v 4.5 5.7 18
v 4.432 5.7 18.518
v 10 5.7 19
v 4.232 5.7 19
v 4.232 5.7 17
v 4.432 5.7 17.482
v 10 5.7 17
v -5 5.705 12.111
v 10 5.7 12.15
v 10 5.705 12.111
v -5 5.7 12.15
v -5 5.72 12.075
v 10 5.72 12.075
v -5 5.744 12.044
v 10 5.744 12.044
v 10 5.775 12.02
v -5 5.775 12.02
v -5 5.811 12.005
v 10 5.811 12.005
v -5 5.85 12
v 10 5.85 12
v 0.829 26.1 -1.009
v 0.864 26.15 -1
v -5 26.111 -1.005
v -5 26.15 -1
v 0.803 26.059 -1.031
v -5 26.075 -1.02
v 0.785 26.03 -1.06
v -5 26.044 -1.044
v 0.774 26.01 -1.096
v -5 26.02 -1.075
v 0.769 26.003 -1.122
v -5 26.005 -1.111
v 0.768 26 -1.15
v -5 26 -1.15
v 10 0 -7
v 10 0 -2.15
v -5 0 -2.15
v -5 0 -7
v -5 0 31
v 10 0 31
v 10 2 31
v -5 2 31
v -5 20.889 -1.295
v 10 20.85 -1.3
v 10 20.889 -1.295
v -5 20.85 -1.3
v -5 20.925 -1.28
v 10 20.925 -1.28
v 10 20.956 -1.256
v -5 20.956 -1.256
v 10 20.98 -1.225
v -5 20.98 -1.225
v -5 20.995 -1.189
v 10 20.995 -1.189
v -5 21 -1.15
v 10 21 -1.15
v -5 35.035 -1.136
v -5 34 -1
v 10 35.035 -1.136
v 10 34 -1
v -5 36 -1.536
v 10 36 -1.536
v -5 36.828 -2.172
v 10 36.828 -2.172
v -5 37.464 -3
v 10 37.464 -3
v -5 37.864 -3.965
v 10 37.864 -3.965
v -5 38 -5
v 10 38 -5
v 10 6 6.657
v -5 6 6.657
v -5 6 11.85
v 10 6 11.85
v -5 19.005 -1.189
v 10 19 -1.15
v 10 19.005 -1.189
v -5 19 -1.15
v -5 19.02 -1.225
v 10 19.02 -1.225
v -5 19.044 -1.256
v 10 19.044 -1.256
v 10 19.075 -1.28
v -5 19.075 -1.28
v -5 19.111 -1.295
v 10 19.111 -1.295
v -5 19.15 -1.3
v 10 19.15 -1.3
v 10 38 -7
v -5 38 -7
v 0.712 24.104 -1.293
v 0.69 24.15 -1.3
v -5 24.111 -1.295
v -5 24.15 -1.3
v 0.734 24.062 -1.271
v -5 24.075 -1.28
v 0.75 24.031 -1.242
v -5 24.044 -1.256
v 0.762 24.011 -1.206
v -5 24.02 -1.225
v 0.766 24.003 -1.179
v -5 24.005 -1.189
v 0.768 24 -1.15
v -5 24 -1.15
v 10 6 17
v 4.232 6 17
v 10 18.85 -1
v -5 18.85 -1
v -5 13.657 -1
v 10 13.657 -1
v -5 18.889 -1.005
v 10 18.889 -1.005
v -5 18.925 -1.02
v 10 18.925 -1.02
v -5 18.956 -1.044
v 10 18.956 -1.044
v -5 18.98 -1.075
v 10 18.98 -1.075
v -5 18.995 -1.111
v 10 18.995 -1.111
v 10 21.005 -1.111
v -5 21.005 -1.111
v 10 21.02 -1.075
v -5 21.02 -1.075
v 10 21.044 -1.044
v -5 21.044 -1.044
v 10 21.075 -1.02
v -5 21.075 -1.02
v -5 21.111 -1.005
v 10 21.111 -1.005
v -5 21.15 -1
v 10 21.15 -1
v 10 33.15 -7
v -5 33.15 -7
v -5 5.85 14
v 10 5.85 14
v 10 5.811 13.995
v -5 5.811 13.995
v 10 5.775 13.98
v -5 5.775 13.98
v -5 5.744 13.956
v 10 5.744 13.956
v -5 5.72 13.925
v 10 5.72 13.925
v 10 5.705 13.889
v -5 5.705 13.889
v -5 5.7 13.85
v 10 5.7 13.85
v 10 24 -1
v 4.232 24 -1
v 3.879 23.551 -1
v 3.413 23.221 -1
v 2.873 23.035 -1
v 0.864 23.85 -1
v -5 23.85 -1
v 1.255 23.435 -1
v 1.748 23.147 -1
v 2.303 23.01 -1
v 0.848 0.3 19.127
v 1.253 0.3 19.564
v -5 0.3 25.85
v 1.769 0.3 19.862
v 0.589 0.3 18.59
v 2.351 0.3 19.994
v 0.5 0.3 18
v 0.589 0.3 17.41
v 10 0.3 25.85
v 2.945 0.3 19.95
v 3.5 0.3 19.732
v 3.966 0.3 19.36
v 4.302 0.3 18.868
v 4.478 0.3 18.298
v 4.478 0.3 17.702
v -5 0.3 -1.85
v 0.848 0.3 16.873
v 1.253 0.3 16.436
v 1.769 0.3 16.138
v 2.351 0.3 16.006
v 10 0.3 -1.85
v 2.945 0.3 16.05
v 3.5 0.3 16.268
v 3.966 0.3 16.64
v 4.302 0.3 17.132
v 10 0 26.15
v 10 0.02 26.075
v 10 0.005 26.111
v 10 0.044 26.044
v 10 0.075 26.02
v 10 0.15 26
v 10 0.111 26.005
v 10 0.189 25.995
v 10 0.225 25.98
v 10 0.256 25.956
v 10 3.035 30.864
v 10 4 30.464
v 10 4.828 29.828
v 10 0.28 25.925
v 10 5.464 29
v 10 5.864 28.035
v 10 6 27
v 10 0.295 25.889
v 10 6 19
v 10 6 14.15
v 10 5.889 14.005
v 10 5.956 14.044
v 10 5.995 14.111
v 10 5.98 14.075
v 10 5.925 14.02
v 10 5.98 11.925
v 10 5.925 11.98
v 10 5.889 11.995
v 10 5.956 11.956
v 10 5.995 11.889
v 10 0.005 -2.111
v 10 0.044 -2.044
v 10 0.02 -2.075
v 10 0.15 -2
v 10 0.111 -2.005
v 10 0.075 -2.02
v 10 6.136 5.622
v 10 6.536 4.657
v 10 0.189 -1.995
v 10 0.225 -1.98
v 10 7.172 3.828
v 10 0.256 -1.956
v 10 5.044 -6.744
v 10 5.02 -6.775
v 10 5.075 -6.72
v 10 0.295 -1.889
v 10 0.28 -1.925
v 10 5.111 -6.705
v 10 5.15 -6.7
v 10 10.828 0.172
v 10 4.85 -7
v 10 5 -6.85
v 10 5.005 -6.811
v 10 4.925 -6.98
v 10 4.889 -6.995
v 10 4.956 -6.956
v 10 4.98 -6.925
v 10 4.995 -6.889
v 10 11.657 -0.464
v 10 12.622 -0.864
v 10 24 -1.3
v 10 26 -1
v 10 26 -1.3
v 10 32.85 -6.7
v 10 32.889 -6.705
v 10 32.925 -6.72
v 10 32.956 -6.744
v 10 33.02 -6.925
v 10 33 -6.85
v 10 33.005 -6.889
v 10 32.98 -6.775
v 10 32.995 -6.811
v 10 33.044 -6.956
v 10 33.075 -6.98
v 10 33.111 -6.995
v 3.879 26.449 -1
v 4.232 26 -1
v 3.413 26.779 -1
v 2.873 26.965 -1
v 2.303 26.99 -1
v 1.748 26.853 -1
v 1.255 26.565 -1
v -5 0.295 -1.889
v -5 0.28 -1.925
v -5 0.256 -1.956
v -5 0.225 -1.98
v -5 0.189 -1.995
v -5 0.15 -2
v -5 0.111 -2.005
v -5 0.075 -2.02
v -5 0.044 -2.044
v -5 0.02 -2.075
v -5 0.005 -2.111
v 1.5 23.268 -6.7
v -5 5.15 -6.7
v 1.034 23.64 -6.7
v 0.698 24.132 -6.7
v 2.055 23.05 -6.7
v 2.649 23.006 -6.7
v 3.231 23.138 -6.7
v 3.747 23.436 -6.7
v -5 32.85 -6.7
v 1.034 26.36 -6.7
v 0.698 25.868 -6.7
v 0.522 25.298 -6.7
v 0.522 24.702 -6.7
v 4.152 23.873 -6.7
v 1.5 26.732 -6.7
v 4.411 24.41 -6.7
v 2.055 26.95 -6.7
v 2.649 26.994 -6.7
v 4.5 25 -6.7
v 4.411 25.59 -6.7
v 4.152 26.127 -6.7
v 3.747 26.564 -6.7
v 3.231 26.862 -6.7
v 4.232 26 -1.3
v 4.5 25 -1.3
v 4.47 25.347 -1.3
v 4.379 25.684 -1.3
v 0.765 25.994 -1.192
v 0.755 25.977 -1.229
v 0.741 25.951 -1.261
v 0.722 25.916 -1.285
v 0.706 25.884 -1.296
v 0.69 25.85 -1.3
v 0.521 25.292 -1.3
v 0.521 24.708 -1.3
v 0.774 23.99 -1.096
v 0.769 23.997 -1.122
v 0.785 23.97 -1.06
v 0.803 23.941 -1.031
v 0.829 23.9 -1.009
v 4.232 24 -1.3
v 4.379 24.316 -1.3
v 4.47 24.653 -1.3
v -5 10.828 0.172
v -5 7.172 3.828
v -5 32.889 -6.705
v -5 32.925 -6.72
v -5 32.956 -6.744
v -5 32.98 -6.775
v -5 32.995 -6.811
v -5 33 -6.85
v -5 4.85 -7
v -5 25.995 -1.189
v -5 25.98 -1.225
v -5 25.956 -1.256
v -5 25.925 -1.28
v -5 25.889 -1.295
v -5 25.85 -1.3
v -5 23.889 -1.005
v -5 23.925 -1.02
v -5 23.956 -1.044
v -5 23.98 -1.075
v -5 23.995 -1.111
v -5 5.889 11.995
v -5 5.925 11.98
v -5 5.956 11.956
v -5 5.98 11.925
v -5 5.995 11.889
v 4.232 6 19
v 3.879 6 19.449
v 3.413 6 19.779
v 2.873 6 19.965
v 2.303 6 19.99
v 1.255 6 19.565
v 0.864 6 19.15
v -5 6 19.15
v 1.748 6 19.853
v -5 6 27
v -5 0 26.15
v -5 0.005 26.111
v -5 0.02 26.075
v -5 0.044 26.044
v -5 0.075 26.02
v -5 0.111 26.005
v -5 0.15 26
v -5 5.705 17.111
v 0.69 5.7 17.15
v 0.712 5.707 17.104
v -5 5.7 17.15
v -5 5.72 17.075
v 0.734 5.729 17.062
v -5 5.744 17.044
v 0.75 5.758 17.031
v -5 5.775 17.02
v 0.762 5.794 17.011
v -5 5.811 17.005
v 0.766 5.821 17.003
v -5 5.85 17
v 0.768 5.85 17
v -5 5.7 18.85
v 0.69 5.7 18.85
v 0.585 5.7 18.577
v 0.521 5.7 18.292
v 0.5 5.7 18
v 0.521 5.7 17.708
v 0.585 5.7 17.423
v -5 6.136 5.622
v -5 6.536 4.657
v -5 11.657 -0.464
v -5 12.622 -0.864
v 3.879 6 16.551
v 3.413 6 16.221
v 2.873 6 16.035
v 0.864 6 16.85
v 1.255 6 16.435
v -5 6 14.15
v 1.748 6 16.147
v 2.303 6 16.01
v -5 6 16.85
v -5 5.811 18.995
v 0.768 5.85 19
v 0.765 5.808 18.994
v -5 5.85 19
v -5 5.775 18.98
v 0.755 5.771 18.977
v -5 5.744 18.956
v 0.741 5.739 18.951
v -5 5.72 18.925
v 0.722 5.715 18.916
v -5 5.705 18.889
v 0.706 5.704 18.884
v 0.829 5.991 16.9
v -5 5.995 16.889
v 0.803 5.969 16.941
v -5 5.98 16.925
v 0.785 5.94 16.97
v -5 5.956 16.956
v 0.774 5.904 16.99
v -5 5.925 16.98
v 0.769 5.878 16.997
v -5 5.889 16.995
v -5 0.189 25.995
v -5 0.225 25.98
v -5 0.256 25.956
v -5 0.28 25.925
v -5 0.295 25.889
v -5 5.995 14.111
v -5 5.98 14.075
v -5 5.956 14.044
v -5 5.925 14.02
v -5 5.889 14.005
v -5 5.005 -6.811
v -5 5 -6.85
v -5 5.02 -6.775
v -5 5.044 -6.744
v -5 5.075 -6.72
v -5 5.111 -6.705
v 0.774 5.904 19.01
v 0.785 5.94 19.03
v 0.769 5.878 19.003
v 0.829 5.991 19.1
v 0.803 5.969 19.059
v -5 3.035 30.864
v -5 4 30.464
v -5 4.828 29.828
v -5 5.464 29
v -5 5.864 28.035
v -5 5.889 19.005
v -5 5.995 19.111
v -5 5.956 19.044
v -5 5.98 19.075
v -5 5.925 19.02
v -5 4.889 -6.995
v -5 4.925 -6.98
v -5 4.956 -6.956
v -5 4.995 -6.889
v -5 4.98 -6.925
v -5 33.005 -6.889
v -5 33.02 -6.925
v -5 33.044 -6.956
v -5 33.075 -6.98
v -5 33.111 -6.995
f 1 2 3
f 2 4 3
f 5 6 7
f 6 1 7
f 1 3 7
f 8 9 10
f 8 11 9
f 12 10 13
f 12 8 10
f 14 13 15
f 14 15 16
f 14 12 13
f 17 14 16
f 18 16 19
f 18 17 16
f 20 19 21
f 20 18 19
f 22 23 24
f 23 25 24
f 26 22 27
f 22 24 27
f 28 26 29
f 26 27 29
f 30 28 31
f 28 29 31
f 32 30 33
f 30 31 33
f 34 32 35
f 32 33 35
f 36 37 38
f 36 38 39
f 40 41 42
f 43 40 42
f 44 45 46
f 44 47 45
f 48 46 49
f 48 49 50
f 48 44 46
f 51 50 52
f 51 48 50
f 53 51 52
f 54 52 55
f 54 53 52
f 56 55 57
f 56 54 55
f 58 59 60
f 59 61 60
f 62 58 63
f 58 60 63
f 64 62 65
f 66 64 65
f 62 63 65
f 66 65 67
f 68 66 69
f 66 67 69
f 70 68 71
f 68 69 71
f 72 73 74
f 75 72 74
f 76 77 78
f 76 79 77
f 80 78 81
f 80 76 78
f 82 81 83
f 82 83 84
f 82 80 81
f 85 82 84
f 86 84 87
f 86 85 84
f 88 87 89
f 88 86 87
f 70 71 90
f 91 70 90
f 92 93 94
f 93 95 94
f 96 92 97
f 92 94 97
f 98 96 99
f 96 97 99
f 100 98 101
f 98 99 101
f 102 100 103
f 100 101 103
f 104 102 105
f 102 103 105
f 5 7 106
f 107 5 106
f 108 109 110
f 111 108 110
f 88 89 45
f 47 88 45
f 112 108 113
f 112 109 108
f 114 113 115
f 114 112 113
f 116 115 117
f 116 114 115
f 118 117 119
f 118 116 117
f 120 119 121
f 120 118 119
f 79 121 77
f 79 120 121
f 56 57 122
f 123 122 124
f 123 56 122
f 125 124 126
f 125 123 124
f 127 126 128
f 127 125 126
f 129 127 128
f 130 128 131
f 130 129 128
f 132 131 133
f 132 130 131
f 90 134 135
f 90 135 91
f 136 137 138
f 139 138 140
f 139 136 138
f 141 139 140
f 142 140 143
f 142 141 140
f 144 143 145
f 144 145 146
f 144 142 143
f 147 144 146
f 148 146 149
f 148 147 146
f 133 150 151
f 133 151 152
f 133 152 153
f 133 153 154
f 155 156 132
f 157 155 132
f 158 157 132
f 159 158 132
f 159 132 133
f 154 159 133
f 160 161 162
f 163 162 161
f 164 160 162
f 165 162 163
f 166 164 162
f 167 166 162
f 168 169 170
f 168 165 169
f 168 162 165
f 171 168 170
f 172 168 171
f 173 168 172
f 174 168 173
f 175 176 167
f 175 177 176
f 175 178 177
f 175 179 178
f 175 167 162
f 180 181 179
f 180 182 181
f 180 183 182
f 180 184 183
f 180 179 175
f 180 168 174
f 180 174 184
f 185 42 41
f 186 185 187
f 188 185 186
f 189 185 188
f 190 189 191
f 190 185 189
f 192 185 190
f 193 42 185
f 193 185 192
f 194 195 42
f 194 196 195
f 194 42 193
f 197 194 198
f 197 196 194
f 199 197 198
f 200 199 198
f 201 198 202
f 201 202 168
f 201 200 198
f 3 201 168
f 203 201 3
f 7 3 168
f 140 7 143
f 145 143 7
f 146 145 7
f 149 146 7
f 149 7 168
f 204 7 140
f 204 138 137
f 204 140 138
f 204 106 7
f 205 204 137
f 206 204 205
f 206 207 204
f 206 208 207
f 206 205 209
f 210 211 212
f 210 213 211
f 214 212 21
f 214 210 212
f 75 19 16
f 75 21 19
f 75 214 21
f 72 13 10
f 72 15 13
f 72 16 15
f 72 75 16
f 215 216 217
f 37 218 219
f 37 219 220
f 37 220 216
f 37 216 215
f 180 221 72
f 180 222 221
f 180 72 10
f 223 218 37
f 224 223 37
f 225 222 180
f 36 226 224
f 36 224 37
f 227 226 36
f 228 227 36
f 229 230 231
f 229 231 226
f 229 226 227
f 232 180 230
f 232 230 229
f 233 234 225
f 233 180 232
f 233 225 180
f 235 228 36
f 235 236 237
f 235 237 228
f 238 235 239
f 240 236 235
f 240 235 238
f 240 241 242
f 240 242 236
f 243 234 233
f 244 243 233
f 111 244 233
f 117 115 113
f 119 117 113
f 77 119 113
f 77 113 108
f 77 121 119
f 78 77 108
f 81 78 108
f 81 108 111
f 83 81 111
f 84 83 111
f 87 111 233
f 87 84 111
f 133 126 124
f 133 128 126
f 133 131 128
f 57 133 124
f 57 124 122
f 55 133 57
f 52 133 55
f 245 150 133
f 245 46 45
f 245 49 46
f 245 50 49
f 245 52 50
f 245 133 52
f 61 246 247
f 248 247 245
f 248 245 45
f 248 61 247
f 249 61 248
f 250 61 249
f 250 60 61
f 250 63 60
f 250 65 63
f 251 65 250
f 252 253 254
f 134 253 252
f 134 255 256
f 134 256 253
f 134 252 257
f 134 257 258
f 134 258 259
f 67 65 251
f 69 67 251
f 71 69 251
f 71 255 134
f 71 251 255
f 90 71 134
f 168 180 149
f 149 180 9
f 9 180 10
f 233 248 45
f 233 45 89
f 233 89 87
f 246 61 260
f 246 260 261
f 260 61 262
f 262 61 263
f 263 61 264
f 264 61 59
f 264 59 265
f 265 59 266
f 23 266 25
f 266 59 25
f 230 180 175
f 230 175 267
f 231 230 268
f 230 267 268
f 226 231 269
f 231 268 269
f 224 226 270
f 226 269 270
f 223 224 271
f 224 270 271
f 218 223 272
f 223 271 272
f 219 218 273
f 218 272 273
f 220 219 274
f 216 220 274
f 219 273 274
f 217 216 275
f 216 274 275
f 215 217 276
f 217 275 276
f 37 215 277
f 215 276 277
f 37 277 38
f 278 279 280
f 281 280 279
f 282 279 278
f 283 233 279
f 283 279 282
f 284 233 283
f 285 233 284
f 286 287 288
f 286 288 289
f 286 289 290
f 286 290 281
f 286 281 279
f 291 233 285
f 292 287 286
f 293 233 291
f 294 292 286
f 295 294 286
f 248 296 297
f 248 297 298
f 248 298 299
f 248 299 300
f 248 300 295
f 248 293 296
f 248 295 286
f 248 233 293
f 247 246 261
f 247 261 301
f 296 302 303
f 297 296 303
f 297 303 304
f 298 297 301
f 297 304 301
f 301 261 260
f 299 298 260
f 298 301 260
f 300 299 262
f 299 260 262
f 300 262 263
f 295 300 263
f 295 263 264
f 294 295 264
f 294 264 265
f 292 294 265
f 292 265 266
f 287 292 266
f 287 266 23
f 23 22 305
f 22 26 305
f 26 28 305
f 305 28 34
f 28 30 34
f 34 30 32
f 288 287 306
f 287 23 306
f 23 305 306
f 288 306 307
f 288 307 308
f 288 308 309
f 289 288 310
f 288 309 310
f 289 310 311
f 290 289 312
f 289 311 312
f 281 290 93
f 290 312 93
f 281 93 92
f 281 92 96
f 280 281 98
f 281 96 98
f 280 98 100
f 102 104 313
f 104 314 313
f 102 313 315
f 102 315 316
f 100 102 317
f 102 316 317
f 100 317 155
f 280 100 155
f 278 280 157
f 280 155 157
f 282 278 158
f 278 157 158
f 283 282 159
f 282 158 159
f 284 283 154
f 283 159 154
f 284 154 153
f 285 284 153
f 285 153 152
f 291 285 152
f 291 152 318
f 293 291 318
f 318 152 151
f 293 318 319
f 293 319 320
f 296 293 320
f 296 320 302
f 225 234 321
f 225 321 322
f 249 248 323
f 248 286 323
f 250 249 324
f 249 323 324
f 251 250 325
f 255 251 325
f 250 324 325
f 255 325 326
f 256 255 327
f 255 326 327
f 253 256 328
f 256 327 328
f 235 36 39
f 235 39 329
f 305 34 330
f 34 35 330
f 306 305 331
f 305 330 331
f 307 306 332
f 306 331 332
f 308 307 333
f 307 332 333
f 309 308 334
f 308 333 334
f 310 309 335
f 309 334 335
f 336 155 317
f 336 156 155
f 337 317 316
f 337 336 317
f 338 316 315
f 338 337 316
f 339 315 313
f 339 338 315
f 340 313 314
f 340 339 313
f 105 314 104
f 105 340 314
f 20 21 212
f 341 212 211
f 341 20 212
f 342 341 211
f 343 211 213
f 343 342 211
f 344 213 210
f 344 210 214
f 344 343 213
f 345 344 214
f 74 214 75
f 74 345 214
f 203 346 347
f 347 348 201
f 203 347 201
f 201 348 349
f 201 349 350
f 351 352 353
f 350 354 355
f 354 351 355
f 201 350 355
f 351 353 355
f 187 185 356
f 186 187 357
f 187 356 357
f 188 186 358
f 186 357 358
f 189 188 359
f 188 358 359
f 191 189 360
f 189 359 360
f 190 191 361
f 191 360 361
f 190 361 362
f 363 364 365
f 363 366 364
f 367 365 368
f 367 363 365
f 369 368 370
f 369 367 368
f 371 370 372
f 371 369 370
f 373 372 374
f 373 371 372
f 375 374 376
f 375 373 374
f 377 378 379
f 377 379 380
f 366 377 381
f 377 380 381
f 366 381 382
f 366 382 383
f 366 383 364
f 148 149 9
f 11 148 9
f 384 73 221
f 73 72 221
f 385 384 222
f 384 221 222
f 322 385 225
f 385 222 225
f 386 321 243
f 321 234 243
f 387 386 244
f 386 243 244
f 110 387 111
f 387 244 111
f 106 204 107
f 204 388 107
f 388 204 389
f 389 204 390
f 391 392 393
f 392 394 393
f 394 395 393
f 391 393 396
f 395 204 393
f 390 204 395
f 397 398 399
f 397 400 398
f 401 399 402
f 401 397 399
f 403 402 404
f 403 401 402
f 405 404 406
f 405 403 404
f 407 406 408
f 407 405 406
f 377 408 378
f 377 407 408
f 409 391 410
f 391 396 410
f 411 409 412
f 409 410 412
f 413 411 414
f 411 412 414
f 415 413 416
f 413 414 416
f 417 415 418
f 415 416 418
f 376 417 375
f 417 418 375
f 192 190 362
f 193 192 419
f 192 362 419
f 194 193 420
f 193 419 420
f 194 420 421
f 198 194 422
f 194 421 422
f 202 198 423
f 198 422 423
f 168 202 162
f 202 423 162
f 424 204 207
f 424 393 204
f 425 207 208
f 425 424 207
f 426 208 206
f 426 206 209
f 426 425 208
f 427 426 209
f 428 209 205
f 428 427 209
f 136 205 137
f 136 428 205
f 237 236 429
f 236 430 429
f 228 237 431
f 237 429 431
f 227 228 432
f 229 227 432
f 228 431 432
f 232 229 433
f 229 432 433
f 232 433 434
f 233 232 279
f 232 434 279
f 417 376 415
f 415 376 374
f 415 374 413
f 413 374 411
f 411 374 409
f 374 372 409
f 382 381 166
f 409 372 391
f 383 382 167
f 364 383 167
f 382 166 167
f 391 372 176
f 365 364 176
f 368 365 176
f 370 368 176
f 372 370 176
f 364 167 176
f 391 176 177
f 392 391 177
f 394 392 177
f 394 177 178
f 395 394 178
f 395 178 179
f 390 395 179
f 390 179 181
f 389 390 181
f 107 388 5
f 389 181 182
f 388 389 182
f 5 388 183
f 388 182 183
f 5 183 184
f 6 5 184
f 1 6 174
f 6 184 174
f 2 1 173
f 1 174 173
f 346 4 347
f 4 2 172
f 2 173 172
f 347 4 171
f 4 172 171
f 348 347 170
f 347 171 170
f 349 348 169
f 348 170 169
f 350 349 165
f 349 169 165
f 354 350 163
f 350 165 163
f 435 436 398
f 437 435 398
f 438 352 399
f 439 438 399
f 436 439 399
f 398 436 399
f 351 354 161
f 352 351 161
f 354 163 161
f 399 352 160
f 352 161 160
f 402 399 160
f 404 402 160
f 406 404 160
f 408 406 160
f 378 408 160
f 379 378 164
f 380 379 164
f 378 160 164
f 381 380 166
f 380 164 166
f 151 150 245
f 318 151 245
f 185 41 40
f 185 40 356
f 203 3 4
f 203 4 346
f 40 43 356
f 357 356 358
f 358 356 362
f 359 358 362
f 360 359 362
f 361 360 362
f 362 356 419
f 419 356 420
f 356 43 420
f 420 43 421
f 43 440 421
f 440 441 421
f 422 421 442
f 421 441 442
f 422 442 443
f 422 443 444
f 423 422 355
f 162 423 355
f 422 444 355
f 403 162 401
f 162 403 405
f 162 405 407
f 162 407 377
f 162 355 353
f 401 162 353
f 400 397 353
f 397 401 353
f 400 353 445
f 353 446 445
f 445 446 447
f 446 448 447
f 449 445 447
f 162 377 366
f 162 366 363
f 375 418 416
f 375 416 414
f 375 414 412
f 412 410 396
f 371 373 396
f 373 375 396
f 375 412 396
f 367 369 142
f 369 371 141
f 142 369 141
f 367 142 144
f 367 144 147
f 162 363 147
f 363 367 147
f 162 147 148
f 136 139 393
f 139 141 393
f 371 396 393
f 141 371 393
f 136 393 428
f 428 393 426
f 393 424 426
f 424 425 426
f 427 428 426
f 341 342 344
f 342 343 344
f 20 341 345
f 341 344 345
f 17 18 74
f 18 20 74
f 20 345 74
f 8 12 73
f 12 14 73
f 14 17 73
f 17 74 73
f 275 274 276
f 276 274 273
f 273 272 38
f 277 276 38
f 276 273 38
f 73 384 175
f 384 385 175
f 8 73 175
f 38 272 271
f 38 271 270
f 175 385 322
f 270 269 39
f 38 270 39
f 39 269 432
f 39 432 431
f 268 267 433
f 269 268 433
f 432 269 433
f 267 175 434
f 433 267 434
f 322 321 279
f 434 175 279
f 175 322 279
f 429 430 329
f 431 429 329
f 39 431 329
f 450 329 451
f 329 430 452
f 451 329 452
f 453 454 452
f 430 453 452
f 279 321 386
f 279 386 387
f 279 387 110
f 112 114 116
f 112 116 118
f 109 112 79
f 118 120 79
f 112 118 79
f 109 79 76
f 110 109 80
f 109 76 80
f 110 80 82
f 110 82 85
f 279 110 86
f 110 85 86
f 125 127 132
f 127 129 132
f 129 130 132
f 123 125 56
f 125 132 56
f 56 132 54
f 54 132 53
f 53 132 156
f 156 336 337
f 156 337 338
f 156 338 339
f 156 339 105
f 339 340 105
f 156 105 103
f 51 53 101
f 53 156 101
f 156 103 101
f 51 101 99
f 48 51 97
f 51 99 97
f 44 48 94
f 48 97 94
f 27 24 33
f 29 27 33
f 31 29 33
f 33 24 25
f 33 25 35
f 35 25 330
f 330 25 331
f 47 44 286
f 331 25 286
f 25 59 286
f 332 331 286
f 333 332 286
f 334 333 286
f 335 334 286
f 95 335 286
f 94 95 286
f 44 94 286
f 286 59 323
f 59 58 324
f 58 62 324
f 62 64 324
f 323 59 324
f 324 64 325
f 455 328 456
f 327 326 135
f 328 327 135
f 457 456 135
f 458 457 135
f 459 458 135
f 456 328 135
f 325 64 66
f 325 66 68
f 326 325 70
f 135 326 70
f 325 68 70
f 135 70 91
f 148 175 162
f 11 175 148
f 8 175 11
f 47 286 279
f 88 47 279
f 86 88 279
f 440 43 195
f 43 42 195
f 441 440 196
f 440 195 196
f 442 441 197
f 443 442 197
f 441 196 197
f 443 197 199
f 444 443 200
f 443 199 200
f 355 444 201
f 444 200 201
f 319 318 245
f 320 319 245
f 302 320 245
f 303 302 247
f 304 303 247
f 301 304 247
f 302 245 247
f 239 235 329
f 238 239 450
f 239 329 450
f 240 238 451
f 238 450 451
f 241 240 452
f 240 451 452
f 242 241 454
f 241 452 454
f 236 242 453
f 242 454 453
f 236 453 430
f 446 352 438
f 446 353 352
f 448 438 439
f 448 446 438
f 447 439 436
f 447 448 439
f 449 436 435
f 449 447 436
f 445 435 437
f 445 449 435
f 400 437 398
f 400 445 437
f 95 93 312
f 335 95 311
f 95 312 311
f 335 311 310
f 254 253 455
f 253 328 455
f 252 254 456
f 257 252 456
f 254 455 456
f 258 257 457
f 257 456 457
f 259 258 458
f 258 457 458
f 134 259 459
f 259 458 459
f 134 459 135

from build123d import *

# Parameters (mm, degrees)
ESBO_O1_W                  = 38
ESBO_O1_H                  = 38
RESSALTO_EXTRUS_O1_DEPTH   = 15
CORTE_EXTRUS_O1_DEPTH      = 52.28352562
ESBO_O7_W                  = 0.3
ESBO_O7_H                  = 28
ESBO_O7_W_2                = 28
ESBO_O7_H_2                = 0.3
ESBO_O7_W_3                = 2
ESBO_O7_H_3                = 2
CORTE_EXTRUS_O2_DEPTH      = 52.28352562
FURO_DE_DI_METRO_7_0_7_3_D = 4
FURO_DE_DI_METRO_7_0_7_2_D = 4
FILETE1_R                  = 4
FILETE2_R                  = 0.15


with BuildPart() as part:
    # Esboço1 → Ressalto-extrusão1 (new body)
    with BuildSketch(Plane(origin=(10, 0, 0), x_dir=(0, 0, -1), z_dir=(1, 0, 0))):
        with Locations((-12, 19)):
            Rectangle(ESBO_O1_W, ESBO_O1_H)
    extrude(amount=-RESSALTO_EXTRUS_O1_DEPTH)

    # Esboço2 → Corte-extrusão1 (cut, through all)
    with BuildSketch(Plane.ZY.offset(5)):
        Polygon((31, 38), (-1, 38), (-1, 12), (5, 6), (31, 6), align=None)
    extrude(amount=-CORTE_EXTRUS_O1_DEPTH, mode=Mode.SUBTRACT)

    # Esboço7 → Corte-extrusão2 (cut, through all)
    with BuildSketch(Plane(origin=(10, 0, 0), x_dir=(0, 0, -1), z_dir=(1, 0, 0))):
        with Locations((6.85, 19)):
            Rectangle(ESBO_O7_W, ESBO_O7_H)
        with Locations((-12, 0.15)):
            Rectangle(ESBO_O7_W_2, ESBO_O7_H_2)
        with Locations((-13, 5.85)):
            Rectangle(ESBO_O7_W_3, ESBO_O7_H_2)
        with Locations((1.15, 20)):
            Rectangle(ESBO_O7_W, ESBO_O7_H_3)
        with Locations((-18, 5.85)):
            Rectangle(ESBO_O7_W_3, ESBO_O7_H_2)
        with Locations((1.15, 25)):
            Rectangle(ESBO_O7_W, ESBO_O7_H_3)
    extrude(amount=-CORTE_EXTRUS_O2_DEPTH, mode=Mode.SUBTRACT)

    # Furo de diâmetro Ø7.0 (7)3 (through all)
    with Locations(Plane(origin=(0, 6, 0), x_dir=(1, 0, 0), z_dir=(0, 1, 0))):
        with Locations((2.5, -18)):
            Hole(FURO_DE_DI_METRO_7_0_7_3_D / 2)

    # Furo de diâmetro Ø7.0 (7)2 (through all)
    with Locations(Plane(origin=(0, 0, -7), x_dir=(-1, 0, 0), z_dir=(0, 0, -1))):
        with Locations((-2.5, 25)):
            Hole(FURO_DE_DI_METRO_7_0_7_2_D / 2)

    # Filete1
    filete1_edges = [part.edges().sort_by_distance(p)[0] for p in [
        (2.5, 6, 31),
        (2.5, 6, 5),
        (2.5, 12, -1),
        (2.5, 38, -1),
    ]]
    fillet(filete1_edges, radius=FILETE1_R)

    # Filete2
    filete2_edges = [part.edges().sort_by_distance(p)[0] for p in [
        (2.5, 5, -7),
        (2.5, 5, -6.7),
        (2.5, 33, -7),
        (2.5, 33, -6.7),
        (2.5, 0, 26),
        (2.5, 0.3, 26),
        (2.5, 0.3, -2),
        (2.5, 0, -2),
        (2.5, 19, -1.3),
        (2.5, 19, -1),
        (2.5, 21, -1.3),
        (2.5, 21, -1),
        (2.5, 5.7, 14),
        (2.5, 6, 14),
        (2.5, 5.7, 12),
        (2.5, 6, 12),
        (-2.116025404, 26, -1.3),
        (-2.116025404, 24, -1.3),
        (-2.116025404, 24, -1),
        (-2.116025404, 26, -1),
        (-2.116025404, 5.7, 19),
        (-2.116025404, 5.7, 17),
        (-2.116025404, 6, 17),
        (-2.116025404, 6, 19),
    ]]
    fillet(filete2_edges, radius=FILETE2_R - 0.0001)  # a hair under: the kernel refuses the full size


solid = part.part
